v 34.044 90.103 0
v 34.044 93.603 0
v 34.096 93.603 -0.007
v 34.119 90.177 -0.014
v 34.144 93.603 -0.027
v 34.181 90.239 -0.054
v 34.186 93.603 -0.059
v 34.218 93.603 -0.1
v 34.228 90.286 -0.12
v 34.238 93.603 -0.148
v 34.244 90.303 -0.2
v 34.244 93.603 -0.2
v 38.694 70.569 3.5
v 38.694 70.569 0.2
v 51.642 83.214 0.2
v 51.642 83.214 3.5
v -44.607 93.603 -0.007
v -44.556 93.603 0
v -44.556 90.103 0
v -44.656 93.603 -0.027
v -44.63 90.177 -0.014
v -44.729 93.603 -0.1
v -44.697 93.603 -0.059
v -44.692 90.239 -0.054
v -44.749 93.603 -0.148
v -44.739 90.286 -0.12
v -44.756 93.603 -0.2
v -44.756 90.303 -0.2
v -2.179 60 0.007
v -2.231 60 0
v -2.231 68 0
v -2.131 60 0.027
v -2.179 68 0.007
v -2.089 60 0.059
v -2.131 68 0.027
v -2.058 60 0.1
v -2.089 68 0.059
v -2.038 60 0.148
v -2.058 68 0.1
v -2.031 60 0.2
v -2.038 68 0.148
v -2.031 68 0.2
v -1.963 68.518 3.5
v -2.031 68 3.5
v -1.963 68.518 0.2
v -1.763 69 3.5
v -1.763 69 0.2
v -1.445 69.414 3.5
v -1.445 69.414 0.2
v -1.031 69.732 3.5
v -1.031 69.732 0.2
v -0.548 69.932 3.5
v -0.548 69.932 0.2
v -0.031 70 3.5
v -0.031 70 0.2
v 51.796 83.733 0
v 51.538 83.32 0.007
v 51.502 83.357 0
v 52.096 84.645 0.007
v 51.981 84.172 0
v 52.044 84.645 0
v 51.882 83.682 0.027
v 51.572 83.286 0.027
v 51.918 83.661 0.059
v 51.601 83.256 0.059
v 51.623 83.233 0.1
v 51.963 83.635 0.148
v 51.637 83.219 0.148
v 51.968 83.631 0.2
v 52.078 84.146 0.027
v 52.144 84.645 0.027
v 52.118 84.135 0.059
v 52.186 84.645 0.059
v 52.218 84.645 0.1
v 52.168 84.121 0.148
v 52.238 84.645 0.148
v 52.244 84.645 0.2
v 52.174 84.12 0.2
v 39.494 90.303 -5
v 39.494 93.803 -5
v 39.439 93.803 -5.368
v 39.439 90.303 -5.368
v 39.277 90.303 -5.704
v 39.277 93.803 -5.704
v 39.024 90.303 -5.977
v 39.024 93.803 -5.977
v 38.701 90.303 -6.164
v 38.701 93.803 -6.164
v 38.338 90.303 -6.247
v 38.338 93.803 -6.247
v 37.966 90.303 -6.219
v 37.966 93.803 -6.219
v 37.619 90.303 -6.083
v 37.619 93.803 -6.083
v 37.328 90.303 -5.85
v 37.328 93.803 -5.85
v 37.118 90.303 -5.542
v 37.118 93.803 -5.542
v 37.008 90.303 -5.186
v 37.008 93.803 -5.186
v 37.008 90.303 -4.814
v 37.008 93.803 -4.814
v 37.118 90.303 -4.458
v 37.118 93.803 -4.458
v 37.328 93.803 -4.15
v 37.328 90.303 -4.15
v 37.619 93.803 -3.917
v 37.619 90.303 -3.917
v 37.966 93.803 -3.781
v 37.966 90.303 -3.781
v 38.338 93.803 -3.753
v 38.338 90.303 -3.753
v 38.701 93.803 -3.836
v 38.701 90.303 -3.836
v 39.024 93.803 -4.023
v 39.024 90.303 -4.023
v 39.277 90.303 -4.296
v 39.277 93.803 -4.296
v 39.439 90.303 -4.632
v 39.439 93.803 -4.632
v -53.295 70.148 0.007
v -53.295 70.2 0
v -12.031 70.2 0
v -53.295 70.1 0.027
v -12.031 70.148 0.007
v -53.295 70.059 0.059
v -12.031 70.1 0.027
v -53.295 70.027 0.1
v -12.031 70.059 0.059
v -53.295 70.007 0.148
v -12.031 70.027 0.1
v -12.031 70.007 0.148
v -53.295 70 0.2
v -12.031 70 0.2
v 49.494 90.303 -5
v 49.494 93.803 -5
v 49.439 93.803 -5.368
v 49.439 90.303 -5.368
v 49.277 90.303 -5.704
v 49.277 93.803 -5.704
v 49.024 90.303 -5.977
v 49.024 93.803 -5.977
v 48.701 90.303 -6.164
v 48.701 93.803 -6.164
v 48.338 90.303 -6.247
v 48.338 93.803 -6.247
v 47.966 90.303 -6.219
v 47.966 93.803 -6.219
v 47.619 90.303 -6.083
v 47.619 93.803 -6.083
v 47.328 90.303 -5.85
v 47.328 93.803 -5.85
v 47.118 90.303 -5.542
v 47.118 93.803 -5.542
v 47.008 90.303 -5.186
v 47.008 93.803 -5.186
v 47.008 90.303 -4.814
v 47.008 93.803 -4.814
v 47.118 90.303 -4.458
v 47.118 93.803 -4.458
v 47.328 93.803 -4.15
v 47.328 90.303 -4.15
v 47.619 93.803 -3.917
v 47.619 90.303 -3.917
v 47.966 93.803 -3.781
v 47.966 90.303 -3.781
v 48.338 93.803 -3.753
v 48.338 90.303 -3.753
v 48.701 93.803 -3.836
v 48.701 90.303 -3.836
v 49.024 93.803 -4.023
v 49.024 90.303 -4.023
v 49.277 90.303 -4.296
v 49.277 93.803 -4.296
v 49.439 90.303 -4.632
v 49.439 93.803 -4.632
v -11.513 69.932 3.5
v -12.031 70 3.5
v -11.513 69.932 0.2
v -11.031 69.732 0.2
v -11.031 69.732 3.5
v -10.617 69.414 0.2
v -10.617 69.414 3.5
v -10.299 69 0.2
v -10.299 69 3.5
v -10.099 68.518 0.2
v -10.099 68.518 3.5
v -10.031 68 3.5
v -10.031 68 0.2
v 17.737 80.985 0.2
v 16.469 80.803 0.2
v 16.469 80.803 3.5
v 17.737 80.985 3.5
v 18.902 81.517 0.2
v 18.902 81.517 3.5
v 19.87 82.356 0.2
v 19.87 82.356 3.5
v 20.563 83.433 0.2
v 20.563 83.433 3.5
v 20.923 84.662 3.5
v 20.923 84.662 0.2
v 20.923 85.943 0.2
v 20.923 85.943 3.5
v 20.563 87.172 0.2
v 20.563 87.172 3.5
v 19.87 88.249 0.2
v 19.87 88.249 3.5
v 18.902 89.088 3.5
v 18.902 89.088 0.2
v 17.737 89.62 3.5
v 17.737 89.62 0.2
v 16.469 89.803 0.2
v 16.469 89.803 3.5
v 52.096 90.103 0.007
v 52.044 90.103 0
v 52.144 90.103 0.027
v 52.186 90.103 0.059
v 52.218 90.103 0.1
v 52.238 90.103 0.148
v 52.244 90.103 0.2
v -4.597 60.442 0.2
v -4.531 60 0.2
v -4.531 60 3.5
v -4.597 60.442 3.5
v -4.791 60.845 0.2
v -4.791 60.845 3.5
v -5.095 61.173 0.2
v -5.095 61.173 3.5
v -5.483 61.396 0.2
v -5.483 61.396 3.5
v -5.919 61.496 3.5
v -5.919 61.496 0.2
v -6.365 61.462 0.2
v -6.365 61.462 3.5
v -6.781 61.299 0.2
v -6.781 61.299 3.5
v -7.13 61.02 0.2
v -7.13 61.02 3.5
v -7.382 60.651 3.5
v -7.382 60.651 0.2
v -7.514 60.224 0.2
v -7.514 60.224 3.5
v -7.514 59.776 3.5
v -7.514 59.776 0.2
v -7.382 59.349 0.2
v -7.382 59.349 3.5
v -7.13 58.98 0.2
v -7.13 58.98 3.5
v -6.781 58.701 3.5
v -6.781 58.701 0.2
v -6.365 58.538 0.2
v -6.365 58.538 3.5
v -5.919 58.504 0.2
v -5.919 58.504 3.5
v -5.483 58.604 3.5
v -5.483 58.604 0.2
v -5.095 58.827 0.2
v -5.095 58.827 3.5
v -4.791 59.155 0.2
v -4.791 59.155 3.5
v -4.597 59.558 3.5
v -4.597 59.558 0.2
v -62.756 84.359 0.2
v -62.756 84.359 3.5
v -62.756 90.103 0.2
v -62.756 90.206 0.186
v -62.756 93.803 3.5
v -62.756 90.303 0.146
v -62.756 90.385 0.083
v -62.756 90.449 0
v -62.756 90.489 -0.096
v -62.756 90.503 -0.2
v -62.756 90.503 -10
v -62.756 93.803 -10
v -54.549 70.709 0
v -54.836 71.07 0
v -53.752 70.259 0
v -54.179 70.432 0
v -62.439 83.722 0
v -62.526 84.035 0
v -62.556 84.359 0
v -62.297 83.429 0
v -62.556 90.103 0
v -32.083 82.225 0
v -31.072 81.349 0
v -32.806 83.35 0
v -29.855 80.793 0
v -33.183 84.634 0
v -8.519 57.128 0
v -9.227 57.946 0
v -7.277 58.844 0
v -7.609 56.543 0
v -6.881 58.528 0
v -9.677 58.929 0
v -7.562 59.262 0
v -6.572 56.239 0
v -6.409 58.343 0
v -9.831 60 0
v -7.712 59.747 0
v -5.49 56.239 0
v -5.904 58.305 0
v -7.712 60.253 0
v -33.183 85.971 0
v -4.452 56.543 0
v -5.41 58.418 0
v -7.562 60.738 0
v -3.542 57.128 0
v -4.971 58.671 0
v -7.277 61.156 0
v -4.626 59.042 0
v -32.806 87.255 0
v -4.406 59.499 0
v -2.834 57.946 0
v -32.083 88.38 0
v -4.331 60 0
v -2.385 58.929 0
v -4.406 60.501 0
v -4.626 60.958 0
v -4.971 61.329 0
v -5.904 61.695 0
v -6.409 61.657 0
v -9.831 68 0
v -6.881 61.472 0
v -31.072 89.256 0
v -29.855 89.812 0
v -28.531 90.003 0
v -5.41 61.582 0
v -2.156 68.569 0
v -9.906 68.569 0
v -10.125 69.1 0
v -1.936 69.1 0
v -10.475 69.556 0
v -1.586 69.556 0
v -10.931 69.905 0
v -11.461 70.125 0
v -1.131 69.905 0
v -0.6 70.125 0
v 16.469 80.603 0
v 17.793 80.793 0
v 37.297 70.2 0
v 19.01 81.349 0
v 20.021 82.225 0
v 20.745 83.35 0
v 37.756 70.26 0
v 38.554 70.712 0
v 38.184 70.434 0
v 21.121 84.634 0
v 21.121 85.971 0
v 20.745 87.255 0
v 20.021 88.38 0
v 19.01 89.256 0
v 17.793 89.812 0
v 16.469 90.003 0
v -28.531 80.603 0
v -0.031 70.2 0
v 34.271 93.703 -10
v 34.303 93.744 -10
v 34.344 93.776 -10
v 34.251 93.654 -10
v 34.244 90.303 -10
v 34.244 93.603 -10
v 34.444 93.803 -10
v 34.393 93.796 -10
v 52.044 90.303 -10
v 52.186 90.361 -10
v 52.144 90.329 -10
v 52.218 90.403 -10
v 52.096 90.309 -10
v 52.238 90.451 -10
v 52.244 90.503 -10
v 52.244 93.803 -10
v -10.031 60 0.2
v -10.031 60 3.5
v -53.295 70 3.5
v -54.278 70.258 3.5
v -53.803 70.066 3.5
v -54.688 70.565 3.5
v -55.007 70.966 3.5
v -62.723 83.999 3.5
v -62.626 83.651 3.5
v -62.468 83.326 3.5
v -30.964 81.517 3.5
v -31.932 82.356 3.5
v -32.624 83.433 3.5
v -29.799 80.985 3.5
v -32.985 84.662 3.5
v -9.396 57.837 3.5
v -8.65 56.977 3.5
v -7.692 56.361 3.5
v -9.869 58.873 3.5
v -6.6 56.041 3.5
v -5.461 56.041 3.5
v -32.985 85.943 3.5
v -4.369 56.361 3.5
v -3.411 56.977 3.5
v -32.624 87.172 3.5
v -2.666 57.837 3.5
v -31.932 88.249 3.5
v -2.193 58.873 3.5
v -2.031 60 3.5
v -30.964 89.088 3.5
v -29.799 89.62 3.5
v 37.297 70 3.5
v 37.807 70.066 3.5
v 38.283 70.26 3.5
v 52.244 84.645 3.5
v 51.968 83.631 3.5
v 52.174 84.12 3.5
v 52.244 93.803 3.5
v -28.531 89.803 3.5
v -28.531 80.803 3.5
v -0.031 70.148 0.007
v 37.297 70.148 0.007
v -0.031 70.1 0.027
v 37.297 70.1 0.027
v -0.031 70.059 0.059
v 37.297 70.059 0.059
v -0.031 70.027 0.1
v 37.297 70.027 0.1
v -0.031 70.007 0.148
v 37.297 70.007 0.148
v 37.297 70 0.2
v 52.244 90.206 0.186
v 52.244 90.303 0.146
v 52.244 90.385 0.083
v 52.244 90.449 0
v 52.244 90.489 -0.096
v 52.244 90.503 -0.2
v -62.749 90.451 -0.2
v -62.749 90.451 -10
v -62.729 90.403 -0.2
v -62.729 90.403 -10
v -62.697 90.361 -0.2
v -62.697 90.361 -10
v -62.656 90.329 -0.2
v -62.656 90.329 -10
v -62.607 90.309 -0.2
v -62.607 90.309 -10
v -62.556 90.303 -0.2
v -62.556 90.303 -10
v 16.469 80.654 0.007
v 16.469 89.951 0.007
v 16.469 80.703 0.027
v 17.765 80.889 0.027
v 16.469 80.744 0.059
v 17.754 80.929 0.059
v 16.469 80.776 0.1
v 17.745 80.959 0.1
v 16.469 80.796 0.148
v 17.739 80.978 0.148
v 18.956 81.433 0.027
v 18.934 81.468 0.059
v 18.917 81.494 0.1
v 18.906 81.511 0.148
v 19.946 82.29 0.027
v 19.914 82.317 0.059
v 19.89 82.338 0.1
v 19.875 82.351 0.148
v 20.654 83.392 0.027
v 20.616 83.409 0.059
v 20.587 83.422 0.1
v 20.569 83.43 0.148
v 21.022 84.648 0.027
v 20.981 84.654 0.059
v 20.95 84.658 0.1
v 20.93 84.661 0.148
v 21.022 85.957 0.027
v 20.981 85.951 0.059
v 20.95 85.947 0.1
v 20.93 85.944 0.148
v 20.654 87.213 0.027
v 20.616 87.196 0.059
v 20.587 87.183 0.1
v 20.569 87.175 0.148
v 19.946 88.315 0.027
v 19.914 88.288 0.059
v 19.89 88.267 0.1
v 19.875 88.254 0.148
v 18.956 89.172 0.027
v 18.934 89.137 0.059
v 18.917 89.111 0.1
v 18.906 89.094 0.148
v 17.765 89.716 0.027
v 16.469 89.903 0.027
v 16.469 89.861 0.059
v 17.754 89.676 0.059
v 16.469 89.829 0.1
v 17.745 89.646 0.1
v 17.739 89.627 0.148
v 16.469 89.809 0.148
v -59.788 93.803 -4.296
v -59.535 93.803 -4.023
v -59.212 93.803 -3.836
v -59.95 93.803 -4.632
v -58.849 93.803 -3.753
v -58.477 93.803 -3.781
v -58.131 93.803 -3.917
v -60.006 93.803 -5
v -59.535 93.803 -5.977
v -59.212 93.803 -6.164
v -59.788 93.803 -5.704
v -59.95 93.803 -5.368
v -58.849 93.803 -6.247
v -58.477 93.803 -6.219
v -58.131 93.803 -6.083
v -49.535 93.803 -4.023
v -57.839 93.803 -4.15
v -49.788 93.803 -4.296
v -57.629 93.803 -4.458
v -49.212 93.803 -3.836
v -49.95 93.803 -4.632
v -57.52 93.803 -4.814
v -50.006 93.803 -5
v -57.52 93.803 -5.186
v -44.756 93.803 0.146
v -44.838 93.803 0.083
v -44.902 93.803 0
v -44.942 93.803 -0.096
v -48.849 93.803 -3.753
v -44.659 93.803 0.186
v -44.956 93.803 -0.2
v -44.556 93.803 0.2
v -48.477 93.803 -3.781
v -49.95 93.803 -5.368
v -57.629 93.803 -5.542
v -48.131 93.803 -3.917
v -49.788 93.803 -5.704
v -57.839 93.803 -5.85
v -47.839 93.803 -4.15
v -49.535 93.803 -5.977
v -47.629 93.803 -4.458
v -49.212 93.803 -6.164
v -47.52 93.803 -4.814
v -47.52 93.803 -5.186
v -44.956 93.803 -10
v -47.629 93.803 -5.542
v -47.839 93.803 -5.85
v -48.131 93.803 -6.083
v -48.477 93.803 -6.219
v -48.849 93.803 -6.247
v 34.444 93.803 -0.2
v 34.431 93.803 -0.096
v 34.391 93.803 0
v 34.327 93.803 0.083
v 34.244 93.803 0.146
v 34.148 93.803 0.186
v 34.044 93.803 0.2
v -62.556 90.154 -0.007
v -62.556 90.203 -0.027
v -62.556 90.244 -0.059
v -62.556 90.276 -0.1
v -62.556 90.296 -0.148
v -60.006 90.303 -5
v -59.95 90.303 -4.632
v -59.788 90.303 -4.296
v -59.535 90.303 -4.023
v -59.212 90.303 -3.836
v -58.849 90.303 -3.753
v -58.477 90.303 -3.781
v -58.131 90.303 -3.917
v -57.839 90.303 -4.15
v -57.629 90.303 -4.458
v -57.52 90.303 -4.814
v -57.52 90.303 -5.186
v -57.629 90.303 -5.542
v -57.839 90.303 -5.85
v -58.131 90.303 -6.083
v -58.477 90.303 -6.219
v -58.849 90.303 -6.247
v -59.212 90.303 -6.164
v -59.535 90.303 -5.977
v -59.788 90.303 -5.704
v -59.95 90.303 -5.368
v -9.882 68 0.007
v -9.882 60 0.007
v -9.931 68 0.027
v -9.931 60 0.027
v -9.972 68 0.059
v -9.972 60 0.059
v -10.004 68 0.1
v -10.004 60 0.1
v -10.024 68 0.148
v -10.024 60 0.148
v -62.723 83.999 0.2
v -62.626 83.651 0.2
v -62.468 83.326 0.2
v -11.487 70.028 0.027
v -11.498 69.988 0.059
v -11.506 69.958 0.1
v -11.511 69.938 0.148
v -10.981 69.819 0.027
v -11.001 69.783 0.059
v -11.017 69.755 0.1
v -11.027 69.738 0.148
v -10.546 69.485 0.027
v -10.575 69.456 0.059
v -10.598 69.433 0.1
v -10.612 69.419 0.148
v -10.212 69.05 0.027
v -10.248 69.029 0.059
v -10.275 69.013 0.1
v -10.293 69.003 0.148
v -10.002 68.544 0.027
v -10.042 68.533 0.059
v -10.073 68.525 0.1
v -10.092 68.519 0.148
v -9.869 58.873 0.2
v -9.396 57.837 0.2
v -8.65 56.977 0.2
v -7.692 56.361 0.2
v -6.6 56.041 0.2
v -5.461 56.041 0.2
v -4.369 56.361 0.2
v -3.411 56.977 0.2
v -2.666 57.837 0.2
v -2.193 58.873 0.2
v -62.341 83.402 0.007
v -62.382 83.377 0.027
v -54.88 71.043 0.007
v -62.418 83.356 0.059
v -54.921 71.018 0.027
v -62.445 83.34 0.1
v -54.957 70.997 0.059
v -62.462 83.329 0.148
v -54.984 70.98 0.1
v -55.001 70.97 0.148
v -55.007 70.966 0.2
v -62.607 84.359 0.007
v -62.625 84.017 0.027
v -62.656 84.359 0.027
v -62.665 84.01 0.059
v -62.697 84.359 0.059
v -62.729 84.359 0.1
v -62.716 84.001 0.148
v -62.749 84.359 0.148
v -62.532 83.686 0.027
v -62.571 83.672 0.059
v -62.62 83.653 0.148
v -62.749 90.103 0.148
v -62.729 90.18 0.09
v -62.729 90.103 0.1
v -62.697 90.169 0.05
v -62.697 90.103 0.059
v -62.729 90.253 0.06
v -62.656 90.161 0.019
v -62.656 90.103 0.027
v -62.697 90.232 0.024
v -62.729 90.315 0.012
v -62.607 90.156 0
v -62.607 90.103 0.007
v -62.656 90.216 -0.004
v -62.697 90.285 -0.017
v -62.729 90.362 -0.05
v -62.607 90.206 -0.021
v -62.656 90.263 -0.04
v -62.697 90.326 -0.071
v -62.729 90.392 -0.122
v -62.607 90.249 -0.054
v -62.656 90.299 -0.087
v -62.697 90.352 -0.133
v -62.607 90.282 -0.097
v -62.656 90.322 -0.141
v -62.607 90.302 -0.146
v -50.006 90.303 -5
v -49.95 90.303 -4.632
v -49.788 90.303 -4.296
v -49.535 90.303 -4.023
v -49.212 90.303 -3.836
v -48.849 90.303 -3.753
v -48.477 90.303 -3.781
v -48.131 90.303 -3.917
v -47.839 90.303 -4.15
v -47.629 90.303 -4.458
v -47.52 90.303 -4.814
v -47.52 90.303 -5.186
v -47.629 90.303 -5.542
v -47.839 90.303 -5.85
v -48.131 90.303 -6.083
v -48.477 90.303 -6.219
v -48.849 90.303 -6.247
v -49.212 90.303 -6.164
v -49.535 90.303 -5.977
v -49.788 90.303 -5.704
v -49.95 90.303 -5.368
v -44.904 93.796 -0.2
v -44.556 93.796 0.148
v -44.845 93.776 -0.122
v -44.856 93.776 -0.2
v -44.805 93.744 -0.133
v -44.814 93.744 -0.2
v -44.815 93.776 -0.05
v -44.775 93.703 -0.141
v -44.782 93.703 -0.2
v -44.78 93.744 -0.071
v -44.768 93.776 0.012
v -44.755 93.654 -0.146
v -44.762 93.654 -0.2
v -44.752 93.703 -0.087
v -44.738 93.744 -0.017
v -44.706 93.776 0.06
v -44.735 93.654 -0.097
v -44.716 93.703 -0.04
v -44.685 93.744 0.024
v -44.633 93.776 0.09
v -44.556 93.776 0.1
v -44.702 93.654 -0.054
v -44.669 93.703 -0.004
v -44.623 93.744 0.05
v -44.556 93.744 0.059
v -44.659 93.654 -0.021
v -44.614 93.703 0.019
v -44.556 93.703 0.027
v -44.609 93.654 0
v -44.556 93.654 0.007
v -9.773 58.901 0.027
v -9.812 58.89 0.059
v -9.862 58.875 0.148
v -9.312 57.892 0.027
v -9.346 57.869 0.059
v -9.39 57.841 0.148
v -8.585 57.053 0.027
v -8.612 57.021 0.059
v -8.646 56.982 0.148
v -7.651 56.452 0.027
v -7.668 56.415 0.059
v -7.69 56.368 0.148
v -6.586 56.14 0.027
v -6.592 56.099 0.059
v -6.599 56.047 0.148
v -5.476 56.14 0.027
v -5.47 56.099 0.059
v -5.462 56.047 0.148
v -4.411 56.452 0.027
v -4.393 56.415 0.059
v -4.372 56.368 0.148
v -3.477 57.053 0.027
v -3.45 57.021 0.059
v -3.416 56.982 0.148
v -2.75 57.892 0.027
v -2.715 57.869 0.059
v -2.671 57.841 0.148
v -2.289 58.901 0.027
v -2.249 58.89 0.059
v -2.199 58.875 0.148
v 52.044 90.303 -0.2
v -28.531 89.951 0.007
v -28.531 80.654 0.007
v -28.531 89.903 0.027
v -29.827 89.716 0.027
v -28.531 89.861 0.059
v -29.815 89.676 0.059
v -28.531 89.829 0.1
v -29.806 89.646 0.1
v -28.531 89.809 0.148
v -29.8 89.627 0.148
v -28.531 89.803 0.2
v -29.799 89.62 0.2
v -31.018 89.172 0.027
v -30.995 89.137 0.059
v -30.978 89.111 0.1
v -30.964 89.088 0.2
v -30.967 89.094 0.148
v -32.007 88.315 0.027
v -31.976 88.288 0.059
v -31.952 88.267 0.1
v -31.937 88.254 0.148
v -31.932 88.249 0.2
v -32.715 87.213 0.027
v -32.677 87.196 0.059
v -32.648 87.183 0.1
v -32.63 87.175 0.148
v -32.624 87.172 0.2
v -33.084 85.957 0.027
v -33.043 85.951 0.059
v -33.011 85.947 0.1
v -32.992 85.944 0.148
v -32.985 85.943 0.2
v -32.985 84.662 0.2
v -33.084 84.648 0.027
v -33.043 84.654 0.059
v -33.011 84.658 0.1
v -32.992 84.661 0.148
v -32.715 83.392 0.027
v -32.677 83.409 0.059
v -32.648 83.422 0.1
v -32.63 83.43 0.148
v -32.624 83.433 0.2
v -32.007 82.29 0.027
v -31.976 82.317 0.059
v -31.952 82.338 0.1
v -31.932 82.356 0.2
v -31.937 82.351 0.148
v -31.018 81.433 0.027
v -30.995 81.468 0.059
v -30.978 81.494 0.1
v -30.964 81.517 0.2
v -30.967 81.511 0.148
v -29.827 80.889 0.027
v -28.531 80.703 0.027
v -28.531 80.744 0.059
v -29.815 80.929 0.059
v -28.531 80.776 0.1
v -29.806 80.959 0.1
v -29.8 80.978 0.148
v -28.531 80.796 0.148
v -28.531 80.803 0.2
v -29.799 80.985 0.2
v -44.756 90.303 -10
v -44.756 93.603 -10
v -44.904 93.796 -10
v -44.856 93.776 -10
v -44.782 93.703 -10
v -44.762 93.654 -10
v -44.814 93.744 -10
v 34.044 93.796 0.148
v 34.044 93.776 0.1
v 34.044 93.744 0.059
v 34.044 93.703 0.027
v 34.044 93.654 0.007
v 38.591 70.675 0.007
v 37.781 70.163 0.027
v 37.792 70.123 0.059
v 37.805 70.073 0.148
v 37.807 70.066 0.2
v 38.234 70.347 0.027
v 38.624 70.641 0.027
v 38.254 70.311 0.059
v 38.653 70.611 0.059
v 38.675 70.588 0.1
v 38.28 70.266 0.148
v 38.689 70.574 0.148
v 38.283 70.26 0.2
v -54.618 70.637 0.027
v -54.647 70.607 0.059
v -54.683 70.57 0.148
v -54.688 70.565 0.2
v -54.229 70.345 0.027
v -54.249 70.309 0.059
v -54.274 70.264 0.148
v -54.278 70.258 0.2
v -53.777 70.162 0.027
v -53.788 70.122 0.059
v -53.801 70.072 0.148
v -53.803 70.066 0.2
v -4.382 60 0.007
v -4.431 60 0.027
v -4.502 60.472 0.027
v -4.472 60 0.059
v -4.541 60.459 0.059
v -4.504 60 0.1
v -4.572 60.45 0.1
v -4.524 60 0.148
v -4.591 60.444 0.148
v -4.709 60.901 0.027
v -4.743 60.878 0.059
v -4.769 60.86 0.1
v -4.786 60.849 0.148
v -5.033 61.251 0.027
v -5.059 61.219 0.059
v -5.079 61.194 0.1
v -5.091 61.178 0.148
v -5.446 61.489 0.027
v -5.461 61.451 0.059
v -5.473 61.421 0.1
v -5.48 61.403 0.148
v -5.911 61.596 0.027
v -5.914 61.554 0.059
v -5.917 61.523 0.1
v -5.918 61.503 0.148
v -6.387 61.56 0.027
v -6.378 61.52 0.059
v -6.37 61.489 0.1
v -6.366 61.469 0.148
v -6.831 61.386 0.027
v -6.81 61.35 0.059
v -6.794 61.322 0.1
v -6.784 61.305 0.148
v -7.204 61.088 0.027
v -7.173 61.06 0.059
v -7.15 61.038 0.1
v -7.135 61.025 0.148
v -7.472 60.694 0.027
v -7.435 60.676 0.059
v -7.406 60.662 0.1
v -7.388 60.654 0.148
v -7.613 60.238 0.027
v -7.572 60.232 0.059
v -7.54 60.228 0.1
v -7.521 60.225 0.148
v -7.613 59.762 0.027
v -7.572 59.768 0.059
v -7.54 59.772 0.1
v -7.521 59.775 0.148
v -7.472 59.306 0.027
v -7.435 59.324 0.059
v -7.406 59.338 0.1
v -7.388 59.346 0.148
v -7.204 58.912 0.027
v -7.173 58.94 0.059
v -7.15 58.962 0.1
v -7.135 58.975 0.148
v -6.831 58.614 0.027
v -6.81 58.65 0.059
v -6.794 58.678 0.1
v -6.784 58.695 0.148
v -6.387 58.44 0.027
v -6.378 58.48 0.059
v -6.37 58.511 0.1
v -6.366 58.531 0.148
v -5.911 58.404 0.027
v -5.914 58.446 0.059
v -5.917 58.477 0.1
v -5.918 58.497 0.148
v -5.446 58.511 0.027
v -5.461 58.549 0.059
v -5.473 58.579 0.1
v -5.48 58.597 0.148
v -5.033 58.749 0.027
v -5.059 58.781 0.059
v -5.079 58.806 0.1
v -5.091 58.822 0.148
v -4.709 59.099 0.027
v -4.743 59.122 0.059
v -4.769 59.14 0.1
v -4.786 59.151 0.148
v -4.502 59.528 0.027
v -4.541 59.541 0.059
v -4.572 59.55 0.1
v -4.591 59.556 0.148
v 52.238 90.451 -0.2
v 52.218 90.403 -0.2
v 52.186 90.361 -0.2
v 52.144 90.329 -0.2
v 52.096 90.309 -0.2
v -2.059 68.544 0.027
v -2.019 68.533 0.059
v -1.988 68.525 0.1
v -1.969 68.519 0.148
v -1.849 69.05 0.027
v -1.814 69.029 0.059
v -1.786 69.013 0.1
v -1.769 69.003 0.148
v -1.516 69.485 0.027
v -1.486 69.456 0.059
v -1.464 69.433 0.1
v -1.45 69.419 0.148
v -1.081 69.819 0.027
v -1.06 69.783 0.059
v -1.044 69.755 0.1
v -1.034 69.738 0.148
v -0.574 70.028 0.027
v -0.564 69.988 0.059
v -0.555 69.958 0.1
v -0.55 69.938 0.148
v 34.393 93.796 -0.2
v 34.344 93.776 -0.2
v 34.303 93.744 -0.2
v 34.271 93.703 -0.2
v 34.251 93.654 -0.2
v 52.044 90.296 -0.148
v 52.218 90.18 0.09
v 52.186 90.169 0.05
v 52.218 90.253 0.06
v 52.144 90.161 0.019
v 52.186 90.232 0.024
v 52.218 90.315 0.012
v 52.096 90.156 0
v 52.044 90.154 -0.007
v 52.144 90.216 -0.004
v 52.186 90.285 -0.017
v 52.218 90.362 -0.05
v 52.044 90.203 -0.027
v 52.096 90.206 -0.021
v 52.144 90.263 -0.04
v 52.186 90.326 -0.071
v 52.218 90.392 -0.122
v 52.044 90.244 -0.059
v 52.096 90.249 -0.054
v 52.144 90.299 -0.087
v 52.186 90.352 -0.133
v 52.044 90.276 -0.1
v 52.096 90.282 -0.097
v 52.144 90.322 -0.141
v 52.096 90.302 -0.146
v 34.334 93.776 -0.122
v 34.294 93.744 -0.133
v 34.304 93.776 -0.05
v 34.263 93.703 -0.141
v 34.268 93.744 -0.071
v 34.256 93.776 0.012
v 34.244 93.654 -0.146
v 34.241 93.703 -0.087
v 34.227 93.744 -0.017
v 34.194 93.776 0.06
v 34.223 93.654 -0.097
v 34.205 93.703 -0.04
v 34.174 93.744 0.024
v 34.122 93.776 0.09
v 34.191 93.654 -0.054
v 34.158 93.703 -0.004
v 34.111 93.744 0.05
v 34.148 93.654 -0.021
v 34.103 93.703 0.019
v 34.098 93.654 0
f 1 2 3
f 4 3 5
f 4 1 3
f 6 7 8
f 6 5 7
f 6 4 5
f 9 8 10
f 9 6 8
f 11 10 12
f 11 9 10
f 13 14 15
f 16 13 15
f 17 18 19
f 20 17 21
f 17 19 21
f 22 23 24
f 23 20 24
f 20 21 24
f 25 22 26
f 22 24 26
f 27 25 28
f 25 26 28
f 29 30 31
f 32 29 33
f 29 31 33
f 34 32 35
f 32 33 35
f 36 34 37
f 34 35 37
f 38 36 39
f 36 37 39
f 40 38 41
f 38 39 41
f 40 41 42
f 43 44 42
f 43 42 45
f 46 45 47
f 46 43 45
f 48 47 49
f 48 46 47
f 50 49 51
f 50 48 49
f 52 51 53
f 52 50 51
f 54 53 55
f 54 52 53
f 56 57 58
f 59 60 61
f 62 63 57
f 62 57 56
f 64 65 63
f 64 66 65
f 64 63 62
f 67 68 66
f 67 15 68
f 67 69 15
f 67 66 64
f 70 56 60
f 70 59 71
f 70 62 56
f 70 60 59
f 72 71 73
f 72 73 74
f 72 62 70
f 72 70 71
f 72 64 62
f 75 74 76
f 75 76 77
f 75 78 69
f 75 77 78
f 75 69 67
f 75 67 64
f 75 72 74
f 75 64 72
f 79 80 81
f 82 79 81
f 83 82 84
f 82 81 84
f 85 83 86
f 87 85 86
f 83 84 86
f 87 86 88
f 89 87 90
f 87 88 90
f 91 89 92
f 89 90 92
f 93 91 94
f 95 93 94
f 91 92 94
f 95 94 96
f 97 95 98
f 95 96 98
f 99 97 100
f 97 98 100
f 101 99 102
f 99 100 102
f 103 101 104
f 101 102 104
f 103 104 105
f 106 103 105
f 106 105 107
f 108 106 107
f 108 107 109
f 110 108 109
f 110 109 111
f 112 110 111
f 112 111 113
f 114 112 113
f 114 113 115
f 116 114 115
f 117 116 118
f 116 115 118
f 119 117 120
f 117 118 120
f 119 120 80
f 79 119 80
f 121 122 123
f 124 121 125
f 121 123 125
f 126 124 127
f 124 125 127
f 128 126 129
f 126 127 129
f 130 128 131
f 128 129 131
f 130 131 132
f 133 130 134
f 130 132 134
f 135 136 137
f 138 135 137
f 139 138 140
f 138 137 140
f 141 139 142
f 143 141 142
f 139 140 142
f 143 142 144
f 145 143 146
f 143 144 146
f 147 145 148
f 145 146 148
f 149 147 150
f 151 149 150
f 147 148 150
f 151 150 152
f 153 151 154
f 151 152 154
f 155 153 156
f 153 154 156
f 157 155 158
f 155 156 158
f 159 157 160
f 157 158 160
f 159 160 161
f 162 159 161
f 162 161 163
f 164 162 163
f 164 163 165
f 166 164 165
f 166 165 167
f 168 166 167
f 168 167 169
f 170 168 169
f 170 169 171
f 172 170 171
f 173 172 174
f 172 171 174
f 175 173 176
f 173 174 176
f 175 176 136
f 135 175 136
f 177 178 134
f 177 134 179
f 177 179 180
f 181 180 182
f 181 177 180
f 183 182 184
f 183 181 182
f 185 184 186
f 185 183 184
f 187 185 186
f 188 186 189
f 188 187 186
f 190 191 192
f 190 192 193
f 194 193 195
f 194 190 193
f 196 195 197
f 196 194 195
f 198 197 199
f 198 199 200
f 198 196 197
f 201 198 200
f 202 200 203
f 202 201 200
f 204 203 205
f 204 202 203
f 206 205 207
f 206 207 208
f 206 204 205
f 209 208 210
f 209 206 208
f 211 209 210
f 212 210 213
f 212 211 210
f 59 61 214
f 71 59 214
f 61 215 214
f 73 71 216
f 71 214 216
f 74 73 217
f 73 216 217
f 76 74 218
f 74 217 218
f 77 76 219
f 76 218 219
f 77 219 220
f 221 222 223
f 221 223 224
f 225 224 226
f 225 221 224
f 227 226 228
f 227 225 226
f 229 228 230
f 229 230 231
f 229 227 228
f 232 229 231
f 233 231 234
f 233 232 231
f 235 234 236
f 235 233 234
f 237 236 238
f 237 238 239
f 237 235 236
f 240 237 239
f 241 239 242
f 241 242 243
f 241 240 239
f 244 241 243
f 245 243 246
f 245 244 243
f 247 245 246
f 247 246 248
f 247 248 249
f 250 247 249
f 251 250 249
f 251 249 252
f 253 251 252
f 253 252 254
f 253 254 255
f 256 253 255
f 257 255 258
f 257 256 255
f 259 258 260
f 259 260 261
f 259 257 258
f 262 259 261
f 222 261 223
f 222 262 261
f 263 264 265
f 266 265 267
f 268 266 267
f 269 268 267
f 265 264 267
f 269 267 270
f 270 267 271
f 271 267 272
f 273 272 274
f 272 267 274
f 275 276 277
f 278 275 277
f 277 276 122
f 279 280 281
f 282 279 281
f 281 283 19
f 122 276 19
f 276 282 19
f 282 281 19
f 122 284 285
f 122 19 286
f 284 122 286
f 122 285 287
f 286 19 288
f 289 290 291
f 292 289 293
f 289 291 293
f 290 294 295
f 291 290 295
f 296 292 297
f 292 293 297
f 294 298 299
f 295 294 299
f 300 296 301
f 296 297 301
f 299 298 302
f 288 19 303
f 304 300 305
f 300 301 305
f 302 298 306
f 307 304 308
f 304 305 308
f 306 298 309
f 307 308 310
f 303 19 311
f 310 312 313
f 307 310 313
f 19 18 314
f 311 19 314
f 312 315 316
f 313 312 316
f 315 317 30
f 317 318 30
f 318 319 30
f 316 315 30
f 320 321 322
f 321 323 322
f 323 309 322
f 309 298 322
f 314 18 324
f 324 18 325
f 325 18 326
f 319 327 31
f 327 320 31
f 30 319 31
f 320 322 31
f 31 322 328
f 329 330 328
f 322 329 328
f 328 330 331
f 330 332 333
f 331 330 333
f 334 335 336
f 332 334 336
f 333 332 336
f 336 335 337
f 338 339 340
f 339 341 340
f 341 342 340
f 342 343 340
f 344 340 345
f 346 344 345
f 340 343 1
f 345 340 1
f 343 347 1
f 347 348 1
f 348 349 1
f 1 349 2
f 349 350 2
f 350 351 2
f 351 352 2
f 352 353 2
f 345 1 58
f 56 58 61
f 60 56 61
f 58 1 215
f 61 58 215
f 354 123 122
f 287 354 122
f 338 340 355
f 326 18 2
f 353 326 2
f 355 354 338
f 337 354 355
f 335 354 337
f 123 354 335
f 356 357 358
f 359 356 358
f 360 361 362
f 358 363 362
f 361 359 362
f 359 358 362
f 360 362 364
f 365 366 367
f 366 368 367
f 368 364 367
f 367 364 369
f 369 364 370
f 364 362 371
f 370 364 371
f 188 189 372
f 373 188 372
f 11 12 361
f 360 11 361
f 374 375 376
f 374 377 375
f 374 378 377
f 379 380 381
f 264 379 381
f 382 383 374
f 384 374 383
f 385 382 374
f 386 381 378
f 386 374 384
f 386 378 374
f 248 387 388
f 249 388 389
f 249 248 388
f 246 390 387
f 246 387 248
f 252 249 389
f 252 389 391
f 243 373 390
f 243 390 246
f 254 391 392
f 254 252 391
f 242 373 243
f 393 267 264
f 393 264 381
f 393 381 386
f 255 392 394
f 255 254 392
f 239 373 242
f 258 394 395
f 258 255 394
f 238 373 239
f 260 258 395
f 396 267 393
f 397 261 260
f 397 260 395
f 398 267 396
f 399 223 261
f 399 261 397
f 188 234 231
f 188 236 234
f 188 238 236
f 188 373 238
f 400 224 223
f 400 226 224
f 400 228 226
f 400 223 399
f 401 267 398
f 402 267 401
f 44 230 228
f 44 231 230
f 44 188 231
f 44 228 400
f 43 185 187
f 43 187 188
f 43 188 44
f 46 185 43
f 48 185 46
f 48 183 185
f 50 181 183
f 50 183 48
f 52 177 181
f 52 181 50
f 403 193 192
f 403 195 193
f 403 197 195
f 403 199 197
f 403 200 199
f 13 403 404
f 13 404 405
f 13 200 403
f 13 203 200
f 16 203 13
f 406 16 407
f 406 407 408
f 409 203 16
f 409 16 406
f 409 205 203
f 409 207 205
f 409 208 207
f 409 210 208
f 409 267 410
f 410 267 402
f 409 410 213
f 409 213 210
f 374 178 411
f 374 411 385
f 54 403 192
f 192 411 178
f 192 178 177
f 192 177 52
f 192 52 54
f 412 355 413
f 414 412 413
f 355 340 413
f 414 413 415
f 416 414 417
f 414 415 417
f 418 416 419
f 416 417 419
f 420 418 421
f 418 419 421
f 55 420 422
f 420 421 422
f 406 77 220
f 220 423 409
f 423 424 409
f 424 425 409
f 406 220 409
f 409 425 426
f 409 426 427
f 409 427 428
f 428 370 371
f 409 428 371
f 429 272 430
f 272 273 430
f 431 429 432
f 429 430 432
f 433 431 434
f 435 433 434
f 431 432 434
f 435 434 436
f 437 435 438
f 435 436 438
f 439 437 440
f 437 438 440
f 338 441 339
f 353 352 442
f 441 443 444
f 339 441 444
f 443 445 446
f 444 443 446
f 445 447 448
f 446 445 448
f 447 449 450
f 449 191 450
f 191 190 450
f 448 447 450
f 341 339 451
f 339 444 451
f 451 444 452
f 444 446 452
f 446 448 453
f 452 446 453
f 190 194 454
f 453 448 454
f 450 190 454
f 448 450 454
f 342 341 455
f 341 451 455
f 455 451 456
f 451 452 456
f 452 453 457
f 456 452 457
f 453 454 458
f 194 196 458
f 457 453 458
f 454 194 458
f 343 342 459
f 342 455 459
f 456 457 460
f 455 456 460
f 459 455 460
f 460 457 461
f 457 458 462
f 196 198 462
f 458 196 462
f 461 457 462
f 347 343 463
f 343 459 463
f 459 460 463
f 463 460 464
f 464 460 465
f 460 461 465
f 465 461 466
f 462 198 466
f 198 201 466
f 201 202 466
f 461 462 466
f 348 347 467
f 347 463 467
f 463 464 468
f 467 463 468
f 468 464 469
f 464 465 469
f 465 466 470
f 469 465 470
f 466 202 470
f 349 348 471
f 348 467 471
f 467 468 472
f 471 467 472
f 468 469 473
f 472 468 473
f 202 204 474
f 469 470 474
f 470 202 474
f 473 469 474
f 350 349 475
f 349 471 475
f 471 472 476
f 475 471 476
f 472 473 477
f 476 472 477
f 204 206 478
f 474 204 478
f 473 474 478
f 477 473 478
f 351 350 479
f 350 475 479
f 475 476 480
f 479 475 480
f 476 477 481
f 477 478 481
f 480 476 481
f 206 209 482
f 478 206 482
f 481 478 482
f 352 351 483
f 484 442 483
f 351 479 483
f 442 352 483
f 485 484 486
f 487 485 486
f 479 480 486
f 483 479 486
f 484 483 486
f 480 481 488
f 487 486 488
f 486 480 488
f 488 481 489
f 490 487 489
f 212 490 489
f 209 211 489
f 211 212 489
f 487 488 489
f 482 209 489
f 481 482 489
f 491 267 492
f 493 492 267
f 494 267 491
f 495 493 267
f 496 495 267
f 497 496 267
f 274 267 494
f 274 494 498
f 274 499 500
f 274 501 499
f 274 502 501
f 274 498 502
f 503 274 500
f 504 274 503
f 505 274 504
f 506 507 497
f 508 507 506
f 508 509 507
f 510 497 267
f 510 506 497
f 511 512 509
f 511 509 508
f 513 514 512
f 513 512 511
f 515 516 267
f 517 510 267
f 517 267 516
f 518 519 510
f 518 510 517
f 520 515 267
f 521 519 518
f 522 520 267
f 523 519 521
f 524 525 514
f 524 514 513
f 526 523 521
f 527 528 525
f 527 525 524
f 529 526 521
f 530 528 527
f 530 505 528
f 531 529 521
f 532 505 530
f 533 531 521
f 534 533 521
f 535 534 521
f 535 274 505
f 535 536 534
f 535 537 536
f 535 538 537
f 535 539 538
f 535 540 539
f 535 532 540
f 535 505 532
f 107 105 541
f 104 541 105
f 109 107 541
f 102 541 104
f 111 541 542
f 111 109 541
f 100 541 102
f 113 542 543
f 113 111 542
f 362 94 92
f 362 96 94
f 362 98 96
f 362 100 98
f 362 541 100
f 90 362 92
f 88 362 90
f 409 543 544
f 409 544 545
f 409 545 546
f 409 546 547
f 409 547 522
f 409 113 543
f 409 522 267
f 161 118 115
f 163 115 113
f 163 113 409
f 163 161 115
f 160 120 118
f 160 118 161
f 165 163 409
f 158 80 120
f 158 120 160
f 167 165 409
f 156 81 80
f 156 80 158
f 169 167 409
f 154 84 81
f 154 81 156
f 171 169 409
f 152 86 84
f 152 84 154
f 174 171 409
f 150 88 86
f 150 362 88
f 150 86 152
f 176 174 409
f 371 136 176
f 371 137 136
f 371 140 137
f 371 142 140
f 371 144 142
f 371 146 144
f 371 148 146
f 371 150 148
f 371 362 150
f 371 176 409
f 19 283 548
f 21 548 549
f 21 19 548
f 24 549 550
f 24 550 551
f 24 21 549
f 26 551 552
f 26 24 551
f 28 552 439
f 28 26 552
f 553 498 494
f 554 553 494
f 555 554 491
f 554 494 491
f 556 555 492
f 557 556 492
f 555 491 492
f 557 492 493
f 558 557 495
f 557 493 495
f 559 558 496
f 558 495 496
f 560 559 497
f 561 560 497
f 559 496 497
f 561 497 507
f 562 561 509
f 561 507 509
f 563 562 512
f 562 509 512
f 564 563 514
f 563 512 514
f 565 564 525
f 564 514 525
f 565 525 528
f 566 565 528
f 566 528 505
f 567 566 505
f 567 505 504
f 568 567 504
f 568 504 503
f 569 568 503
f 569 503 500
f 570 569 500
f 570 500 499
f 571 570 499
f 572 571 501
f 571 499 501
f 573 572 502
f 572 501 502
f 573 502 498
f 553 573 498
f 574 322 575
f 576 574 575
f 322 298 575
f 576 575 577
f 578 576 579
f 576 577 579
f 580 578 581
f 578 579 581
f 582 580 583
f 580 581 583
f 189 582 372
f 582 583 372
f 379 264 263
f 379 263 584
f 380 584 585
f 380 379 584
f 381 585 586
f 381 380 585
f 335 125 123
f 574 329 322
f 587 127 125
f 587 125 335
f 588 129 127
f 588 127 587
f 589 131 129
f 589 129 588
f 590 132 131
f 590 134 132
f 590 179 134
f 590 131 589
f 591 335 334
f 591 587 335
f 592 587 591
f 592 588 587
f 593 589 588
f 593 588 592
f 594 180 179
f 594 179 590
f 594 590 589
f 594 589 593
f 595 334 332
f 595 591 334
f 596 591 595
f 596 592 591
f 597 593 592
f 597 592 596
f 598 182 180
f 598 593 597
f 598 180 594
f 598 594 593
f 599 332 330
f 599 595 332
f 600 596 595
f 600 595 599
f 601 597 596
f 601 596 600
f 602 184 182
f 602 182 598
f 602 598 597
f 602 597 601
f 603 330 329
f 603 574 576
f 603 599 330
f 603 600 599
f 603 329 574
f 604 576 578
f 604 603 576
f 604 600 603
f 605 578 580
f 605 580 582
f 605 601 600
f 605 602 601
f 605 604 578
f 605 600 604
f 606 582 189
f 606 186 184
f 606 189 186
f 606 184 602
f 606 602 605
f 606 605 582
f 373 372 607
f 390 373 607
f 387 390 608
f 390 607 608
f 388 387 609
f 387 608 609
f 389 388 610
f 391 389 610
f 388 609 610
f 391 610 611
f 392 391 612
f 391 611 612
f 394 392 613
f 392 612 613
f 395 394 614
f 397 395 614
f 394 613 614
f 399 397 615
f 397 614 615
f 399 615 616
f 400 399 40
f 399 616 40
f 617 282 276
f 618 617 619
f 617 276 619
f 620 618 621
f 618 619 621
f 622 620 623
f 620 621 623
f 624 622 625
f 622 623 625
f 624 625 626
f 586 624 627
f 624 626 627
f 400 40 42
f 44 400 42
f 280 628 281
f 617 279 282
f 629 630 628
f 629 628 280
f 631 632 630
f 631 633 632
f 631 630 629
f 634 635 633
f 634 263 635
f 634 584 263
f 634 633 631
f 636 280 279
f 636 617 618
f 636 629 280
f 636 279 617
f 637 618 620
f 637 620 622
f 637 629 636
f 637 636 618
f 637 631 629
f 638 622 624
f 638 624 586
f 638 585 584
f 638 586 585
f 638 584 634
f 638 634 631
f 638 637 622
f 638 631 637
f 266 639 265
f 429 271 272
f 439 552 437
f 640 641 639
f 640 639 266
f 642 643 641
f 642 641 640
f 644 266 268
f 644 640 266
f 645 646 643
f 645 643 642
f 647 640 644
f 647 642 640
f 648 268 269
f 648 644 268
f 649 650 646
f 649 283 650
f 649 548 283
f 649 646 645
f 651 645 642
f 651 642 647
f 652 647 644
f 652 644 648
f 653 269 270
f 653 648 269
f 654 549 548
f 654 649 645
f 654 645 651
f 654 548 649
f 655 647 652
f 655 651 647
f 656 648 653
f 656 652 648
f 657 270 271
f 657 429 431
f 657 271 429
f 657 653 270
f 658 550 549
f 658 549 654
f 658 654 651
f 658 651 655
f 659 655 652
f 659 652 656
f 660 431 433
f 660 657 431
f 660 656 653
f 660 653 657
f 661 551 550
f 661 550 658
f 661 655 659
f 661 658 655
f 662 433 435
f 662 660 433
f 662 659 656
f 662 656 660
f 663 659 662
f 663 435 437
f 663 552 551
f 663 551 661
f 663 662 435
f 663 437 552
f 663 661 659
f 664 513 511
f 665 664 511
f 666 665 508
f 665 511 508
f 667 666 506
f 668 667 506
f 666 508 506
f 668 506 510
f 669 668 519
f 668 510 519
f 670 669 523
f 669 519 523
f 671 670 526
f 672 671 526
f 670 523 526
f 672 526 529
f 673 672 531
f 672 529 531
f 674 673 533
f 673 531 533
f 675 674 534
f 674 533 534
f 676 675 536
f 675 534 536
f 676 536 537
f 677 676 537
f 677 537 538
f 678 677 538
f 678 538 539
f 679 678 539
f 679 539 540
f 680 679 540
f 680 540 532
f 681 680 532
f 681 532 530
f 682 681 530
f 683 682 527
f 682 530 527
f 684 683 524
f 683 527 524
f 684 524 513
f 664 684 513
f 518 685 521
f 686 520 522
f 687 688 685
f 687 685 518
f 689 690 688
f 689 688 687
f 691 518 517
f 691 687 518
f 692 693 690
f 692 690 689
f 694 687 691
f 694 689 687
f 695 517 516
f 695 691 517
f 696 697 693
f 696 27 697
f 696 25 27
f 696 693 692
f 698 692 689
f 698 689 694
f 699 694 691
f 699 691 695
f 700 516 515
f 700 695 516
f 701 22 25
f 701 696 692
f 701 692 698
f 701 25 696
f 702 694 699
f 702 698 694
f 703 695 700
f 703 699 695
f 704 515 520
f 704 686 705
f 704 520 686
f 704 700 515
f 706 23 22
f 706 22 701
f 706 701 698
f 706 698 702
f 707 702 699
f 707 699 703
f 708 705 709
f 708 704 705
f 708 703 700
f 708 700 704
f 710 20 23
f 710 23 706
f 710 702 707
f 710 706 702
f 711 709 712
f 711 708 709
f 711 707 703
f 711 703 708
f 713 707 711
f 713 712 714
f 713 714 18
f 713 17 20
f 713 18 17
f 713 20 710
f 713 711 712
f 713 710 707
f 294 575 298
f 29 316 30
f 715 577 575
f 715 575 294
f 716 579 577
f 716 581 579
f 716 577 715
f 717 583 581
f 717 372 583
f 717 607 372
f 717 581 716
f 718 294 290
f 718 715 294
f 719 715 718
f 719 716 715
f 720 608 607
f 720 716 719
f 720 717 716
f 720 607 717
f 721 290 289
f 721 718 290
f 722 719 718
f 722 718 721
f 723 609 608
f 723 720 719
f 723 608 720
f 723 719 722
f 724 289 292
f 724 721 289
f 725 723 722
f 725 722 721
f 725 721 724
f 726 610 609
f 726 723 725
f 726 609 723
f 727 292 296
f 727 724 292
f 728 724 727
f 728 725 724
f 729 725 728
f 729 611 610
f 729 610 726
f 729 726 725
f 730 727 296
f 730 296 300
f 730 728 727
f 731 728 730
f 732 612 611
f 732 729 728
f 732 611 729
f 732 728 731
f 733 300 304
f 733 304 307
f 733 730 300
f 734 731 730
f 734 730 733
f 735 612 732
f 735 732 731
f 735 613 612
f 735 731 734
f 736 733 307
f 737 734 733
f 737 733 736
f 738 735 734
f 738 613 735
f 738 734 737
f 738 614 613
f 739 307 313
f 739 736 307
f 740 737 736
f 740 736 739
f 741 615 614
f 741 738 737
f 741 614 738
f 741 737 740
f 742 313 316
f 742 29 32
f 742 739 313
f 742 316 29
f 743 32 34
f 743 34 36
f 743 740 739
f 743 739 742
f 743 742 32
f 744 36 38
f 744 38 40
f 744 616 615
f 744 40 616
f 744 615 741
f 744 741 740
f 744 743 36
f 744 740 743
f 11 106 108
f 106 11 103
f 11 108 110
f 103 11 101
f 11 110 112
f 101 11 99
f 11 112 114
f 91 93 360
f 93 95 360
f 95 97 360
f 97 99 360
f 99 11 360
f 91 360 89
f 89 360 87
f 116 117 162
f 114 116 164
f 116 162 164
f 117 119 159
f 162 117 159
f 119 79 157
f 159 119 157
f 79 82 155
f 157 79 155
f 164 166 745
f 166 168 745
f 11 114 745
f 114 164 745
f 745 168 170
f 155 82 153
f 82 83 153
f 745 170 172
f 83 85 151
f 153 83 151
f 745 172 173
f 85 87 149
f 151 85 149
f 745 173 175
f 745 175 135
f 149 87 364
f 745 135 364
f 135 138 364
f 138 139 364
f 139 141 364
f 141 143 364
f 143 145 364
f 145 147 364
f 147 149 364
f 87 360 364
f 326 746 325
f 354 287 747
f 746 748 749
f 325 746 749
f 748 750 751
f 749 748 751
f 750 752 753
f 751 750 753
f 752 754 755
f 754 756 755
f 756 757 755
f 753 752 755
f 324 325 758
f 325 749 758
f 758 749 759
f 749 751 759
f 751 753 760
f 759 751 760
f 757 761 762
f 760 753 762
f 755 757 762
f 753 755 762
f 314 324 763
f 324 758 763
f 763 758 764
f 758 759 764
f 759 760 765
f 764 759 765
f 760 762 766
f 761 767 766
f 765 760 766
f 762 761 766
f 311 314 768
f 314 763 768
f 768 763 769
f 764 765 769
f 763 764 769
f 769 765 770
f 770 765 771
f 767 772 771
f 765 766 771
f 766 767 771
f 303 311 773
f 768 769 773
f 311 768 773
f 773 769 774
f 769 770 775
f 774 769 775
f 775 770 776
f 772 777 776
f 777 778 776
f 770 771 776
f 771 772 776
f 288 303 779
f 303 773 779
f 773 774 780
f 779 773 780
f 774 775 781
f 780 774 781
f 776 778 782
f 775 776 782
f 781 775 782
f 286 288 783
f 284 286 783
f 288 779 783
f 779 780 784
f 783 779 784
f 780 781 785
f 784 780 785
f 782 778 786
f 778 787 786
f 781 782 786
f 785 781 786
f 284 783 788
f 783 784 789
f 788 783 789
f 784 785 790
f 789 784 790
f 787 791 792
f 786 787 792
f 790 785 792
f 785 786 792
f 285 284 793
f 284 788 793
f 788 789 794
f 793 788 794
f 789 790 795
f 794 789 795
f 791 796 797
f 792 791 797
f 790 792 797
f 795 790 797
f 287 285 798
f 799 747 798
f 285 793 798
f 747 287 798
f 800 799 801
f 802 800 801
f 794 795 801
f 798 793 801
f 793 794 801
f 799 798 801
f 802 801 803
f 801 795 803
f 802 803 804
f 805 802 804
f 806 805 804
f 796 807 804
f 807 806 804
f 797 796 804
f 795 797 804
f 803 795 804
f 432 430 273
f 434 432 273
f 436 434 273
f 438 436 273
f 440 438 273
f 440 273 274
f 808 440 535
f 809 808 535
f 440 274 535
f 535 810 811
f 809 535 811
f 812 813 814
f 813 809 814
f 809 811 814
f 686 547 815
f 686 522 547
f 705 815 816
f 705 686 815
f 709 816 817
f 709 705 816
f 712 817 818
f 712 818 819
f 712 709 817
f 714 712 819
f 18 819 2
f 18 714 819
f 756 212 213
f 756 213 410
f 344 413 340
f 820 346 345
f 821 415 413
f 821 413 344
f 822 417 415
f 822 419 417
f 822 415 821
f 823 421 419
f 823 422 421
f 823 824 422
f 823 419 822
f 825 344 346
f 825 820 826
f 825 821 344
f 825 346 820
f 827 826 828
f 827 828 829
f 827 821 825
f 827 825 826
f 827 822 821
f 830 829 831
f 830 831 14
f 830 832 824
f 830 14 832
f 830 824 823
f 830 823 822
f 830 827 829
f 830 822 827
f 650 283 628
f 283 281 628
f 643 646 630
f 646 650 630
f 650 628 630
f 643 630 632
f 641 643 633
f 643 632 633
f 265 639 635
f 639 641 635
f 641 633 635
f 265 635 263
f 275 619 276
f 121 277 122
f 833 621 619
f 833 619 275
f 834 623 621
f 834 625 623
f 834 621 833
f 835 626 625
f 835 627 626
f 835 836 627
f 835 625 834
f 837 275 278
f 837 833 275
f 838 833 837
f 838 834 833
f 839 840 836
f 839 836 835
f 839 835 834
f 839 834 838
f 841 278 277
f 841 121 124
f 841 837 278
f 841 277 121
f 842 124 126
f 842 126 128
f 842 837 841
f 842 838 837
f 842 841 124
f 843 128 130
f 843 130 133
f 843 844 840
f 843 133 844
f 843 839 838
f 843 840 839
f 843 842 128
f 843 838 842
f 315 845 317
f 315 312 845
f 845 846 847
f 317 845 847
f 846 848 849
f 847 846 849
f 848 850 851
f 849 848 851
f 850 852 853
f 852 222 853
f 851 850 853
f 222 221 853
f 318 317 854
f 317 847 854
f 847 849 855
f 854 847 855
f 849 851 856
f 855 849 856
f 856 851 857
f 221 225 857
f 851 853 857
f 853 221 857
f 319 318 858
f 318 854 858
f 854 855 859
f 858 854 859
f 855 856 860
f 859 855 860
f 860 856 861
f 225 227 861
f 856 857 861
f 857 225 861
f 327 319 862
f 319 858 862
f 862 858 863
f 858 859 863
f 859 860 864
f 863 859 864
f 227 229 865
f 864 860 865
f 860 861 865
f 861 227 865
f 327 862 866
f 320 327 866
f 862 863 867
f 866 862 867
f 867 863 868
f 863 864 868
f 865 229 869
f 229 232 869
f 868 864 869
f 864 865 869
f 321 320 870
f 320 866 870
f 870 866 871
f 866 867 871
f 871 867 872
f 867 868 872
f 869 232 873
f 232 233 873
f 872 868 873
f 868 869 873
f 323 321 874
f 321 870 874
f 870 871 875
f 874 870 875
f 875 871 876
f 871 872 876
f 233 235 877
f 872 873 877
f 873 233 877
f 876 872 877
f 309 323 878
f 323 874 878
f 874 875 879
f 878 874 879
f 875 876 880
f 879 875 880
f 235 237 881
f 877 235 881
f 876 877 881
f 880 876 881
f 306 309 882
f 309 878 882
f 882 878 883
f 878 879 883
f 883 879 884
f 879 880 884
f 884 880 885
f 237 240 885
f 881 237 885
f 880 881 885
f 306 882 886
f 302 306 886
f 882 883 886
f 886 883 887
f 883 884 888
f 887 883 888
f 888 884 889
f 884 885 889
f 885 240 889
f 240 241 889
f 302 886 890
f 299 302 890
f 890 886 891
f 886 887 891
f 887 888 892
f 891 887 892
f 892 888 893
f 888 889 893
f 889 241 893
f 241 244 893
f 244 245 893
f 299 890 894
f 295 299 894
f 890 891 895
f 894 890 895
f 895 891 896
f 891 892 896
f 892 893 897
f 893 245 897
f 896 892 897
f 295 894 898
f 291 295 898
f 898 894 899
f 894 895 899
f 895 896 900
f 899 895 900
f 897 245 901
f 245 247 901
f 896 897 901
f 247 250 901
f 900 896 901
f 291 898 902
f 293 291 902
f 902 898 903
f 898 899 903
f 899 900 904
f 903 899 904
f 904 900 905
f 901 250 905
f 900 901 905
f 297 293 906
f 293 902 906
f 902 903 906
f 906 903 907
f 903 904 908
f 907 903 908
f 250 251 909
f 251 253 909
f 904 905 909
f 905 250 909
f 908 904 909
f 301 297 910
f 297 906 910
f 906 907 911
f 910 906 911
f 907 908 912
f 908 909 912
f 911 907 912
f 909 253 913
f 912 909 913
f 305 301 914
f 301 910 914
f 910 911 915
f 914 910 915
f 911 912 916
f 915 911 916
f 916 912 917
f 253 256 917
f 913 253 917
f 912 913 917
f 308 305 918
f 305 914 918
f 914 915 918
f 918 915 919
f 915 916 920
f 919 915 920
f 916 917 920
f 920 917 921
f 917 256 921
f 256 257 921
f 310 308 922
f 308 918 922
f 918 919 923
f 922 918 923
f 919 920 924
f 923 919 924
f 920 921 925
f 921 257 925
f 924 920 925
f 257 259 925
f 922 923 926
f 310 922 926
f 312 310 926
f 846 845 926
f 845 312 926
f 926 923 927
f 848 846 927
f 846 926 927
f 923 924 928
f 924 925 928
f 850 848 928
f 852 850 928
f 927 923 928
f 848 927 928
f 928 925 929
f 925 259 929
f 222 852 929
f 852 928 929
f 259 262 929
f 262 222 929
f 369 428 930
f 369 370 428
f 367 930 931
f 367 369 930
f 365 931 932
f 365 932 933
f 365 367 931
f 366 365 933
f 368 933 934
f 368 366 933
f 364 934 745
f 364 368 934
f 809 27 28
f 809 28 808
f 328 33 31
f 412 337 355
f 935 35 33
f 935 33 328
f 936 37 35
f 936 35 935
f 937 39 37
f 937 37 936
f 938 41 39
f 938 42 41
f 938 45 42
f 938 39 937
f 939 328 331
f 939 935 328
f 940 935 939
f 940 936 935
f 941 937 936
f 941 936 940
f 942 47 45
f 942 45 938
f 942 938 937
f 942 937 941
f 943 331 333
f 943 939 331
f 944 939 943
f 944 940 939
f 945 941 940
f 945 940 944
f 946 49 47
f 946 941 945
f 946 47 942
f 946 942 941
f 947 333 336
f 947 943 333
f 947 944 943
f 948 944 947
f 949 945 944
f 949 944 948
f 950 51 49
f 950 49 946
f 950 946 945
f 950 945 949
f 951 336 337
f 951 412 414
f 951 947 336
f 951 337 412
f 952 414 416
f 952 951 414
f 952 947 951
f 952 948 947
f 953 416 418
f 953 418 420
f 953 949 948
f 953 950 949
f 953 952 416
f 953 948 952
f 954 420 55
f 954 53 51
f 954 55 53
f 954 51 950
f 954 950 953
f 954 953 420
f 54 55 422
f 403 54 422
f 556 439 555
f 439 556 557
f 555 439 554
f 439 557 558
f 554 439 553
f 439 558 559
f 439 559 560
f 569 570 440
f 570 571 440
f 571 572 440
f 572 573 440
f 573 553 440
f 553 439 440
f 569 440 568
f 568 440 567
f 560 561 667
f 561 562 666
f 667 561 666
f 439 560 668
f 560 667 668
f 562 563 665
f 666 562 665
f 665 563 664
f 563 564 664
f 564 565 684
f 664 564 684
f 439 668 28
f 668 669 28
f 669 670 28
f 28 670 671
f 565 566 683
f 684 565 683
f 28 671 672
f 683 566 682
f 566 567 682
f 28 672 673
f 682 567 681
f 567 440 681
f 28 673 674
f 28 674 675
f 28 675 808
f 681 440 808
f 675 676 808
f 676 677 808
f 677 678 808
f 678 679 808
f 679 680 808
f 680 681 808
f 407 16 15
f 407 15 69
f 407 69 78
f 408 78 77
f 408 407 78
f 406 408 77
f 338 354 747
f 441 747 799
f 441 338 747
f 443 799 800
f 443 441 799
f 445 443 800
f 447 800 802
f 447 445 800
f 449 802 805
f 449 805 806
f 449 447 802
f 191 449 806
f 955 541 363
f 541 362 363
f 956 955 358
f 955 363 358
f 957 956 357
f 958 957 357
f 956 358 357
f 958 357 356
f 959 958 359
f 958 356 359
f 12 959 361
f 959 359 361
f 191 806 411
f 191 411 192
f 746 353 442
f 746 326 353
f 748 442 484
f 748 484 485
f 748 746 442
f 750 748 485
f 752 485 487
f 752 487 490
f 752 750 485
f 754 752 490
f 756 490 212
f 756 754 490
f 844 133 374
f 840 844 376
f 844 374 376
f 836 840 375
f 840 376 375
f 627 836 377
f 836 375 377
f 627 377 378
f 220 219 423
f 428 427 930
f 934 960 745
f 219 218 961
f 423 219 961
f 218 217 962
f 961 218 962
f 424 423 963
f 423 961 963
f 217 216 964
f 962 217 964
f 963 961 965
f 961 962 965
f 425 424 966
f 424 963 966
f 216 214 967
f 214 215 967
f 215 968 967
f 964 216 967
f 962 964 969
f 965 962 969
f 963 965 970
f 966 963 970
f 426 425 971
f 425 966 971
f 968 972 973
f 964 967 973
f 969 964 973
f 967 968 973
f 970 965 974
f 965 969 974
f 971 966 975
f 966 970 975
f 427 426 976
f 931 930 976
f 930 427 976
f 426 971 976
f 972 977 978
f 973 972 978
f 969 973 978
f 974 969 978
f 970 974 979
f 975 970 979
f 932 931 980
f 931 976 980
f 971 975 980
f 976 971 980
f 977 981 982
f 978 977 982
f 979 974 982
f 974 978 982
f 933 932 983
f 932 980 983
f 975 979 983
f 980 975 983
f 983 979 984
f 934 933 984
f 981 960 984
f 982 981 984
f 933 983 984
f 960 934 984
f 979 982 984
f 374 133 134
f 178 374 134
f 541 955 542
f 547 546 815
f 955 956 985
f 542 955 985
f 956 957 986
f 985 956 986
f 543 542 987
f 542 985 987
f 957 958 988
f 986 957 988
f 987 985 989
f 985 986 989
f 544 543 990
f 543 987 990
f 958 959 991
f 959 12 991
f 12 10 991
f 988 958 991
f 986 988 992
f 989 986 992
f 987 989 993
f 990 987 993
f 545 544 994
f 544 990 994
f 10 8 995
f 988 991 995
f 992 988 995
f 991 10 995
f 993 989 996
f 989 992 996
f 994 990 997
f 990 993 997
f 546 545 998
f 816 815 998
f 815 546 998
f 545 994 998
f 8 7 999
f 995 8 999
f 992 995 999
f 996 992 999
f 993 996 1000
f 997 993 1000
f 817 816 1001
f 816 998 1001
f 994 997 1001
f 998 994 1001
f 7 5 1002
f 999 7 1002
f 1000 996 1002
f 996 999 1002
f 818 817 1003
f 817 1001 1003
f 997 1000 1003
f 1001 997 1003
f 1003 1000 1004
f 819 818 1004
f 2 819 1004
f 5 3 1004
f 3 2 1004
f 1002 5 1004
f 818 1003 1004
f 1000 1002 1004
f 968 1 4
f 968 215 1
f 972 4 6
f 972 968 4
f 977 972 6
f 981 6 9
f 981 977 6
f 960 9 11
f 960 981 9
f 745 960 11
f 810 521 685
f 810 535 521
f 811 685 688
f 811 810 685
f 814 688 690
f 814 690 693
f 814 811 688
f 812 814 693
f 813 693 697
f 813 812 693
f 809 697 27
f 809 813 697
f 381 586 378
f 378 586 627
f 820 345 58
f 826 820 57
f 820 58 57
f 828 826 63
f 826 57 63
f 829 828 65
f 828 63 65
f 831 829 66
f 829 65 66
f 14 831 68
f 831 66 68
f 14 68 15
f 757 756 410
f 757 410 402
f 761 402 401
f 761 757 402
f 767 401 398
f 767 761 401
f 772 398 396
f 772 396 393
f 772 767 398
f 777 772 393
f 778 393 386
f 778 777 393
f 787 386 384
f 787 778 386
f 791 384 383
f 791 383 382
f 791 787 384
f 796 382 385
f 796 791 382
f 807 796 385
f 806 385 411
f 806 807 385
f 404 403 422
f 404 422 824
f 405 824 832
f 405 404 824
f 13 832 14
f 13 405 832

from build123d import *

# Parameters (mm, degrees)
SKETCH5_R           = 1.5
BOSS_EXTRUDE1_DEPTH = 3.5
SKETCH6_W           = 18
SKETCH6_H           = 10
SKETCH6_R           = 1.25
BOSS_EXTRUDE2_DEPTH = 3.5
FILLET1_R           = 2
FILLET2_R           = 0.2


with BuildPart() as part:
    # Sketch5 → Boss-Extrude1 (new body)
    with BuildSketch(Plane.XY):
        with BuildLine():
            Line((52.244364221, 93.802541786), (-62.755635779, 93.802541786))
            Line((-62.755635779, 93.802541786), (-62.755635779, 83.802541786))
            Line((-62.755635779, 83.802541786), (-54.423503372, 70))
            Line((-54.423503372, 70), (-10.03072393, 70))
            Line((-10.03072393, 70), (-10.03072393, 60))
            ThreePointArc((-10.03072393, 60), (-6.03072393, 56), (-2.03072393, 60))
            Line((-2.03072393, 60), (-2.03072393, 70))
            Line((-2.03072393, 70), (38.111411694, 70))
            Line((38.111411694, 70), (52.244364221, 83.802541786))
            Line((52.244364221, 83.802541786), (52.244364221, 93.802541786))
        make_face()
        with Locations((-6.03072393, 60)):
            Circle(SKETCH5_R, mode=Mode.SUBTRACT)
        with BuildLine():
            Line((16.46927607, 89.802541786), (-28.53072393, 89.802541786))
            ThreePointArc((-28.53072393, 89.802541786), (-33.03072393, 85.302541786), (-28.53072393, 80.802541786))
            Line((-28.53072393, 80.802541786), (16.46927607, 80.802541786))
            ThreePointArc((16.46927607, 80.802541786), (20.96927607, 85.302541786), (16.46927607, 89.802541786))
        make_face(mode=Mode.SUBTRACT)
    extrude(amount=BOSS_EXTRUDE1_DEPTH)

    # Sketch6 → Boss-Extrude2 (add)
    # profile 1 of 2: a face of its own
    with BuildSketch(Plane(origin=(0, 93.802541786, 0), x_dir=(1, 0, 0), z_dir=(0, 1, 0))):
        with Locations((-53.755635779, 5)):
            Rectangle(SKETCH6_W, SKETCH6_H)
        with Locations(Location((-58.755635779, 5, 0), (0, 0, 180))):
            Circle(SKETCH6_R, mode=Mode.SUBTRACT)
        with Locations(Location((-48.755635779, 5, 0), (0, 0, 180))):
            Circle(SKETCH6_R, mode=Mode.SUBTRACT)
    # profile 2 of 2: a face of its own
    with BuildSketch(Plane(origin=(0, 93.802541786, 0), x_dir=(1, 0, 0), z_dir=(0, 1, 0))):
        with Locations((43.244364221, 5)):
            Rectangle(SKETCH6_W, SKETCH6_H)
        with Locations((38.244364221, 5)):
            Circle(SKETCH6_R, mode=Mode.SUBTRACT)
        with Locations((48.244364221, 5)):
            Circle(SKETCH6_R, mode=Mode.SUBTRACT)
    extrude(amount=-BOSS_EXTRUDE2_DEPTH)

    # Fillet1
    fillet1_edges = [part.edges().sort_by_distance(p)[0] for p in [
        (52.244364221, 83.802541786, 1.75),
        (38.111411694, 70, 1.75),
        (-2.03072393, 70, 1.75),
        (-10.03072393, 70, 1.75),
        (-54.423503372, 70, 1.75),
        (-62.755635779, 83.802541786, 1.75),
    ]]
    fillet(fillet1_edges, radius=FILLET1_R)

    # Fillet2
    fillet2_edges = [part.edges().sort_by_distance(p)[0] for p in [
        (-2.03072393, 64, 0),
        (-6.03072393, 56, 0),
        (-7.53072393, 60, 0),
        (-33.03072393, 85.302541786, 0),
        (-6.03072393, 80.802541786, 0),
        (20.96927607, 85.302541786, 0),
        (-6.03072393, 89.802541786, 0),
        (-62.755635779, 87.330975349, 0),
        (-62.755635779, 90.302541786, -5),
        (-53.755635779, 90.302541786, 0),
        (-44.755635779, 92.052541786, 0),
        (-44.755635779, 93.802541786, -5),
        (-5.255635779, 93.802541786, 0),
        (52.244364221, 90.302541786, -5),
        (43.244364221, 90.302541786, 0),
        (34.244364221, 92.052541786, 0),
        (34.244364221, 93.802541786, -5),
        (-10.03072393, 64, 0),
        (-32.662699153, 70, 0),
        (18.633041615, 70, 0),
        (52.244364221, 87.473700585, 0),
        (45.167974716, 76.891589411, 0),
        (-58.737365074, 77.146100601, 0),
        (-62.682345408, 83.822948285, 0),
        (-54.277728874, 70.258275609, 0),
        (38.051233908, 70.147747242, 0),
        (52.087564977, 83.868579168, 0),
        (-10.616510367, 69.414213562, 0),
        (-1.444937492, 69.414213562, 0),
    ]]
    fillet(fillet2_edges, radius=FILLET2_R)


solid = part.part
